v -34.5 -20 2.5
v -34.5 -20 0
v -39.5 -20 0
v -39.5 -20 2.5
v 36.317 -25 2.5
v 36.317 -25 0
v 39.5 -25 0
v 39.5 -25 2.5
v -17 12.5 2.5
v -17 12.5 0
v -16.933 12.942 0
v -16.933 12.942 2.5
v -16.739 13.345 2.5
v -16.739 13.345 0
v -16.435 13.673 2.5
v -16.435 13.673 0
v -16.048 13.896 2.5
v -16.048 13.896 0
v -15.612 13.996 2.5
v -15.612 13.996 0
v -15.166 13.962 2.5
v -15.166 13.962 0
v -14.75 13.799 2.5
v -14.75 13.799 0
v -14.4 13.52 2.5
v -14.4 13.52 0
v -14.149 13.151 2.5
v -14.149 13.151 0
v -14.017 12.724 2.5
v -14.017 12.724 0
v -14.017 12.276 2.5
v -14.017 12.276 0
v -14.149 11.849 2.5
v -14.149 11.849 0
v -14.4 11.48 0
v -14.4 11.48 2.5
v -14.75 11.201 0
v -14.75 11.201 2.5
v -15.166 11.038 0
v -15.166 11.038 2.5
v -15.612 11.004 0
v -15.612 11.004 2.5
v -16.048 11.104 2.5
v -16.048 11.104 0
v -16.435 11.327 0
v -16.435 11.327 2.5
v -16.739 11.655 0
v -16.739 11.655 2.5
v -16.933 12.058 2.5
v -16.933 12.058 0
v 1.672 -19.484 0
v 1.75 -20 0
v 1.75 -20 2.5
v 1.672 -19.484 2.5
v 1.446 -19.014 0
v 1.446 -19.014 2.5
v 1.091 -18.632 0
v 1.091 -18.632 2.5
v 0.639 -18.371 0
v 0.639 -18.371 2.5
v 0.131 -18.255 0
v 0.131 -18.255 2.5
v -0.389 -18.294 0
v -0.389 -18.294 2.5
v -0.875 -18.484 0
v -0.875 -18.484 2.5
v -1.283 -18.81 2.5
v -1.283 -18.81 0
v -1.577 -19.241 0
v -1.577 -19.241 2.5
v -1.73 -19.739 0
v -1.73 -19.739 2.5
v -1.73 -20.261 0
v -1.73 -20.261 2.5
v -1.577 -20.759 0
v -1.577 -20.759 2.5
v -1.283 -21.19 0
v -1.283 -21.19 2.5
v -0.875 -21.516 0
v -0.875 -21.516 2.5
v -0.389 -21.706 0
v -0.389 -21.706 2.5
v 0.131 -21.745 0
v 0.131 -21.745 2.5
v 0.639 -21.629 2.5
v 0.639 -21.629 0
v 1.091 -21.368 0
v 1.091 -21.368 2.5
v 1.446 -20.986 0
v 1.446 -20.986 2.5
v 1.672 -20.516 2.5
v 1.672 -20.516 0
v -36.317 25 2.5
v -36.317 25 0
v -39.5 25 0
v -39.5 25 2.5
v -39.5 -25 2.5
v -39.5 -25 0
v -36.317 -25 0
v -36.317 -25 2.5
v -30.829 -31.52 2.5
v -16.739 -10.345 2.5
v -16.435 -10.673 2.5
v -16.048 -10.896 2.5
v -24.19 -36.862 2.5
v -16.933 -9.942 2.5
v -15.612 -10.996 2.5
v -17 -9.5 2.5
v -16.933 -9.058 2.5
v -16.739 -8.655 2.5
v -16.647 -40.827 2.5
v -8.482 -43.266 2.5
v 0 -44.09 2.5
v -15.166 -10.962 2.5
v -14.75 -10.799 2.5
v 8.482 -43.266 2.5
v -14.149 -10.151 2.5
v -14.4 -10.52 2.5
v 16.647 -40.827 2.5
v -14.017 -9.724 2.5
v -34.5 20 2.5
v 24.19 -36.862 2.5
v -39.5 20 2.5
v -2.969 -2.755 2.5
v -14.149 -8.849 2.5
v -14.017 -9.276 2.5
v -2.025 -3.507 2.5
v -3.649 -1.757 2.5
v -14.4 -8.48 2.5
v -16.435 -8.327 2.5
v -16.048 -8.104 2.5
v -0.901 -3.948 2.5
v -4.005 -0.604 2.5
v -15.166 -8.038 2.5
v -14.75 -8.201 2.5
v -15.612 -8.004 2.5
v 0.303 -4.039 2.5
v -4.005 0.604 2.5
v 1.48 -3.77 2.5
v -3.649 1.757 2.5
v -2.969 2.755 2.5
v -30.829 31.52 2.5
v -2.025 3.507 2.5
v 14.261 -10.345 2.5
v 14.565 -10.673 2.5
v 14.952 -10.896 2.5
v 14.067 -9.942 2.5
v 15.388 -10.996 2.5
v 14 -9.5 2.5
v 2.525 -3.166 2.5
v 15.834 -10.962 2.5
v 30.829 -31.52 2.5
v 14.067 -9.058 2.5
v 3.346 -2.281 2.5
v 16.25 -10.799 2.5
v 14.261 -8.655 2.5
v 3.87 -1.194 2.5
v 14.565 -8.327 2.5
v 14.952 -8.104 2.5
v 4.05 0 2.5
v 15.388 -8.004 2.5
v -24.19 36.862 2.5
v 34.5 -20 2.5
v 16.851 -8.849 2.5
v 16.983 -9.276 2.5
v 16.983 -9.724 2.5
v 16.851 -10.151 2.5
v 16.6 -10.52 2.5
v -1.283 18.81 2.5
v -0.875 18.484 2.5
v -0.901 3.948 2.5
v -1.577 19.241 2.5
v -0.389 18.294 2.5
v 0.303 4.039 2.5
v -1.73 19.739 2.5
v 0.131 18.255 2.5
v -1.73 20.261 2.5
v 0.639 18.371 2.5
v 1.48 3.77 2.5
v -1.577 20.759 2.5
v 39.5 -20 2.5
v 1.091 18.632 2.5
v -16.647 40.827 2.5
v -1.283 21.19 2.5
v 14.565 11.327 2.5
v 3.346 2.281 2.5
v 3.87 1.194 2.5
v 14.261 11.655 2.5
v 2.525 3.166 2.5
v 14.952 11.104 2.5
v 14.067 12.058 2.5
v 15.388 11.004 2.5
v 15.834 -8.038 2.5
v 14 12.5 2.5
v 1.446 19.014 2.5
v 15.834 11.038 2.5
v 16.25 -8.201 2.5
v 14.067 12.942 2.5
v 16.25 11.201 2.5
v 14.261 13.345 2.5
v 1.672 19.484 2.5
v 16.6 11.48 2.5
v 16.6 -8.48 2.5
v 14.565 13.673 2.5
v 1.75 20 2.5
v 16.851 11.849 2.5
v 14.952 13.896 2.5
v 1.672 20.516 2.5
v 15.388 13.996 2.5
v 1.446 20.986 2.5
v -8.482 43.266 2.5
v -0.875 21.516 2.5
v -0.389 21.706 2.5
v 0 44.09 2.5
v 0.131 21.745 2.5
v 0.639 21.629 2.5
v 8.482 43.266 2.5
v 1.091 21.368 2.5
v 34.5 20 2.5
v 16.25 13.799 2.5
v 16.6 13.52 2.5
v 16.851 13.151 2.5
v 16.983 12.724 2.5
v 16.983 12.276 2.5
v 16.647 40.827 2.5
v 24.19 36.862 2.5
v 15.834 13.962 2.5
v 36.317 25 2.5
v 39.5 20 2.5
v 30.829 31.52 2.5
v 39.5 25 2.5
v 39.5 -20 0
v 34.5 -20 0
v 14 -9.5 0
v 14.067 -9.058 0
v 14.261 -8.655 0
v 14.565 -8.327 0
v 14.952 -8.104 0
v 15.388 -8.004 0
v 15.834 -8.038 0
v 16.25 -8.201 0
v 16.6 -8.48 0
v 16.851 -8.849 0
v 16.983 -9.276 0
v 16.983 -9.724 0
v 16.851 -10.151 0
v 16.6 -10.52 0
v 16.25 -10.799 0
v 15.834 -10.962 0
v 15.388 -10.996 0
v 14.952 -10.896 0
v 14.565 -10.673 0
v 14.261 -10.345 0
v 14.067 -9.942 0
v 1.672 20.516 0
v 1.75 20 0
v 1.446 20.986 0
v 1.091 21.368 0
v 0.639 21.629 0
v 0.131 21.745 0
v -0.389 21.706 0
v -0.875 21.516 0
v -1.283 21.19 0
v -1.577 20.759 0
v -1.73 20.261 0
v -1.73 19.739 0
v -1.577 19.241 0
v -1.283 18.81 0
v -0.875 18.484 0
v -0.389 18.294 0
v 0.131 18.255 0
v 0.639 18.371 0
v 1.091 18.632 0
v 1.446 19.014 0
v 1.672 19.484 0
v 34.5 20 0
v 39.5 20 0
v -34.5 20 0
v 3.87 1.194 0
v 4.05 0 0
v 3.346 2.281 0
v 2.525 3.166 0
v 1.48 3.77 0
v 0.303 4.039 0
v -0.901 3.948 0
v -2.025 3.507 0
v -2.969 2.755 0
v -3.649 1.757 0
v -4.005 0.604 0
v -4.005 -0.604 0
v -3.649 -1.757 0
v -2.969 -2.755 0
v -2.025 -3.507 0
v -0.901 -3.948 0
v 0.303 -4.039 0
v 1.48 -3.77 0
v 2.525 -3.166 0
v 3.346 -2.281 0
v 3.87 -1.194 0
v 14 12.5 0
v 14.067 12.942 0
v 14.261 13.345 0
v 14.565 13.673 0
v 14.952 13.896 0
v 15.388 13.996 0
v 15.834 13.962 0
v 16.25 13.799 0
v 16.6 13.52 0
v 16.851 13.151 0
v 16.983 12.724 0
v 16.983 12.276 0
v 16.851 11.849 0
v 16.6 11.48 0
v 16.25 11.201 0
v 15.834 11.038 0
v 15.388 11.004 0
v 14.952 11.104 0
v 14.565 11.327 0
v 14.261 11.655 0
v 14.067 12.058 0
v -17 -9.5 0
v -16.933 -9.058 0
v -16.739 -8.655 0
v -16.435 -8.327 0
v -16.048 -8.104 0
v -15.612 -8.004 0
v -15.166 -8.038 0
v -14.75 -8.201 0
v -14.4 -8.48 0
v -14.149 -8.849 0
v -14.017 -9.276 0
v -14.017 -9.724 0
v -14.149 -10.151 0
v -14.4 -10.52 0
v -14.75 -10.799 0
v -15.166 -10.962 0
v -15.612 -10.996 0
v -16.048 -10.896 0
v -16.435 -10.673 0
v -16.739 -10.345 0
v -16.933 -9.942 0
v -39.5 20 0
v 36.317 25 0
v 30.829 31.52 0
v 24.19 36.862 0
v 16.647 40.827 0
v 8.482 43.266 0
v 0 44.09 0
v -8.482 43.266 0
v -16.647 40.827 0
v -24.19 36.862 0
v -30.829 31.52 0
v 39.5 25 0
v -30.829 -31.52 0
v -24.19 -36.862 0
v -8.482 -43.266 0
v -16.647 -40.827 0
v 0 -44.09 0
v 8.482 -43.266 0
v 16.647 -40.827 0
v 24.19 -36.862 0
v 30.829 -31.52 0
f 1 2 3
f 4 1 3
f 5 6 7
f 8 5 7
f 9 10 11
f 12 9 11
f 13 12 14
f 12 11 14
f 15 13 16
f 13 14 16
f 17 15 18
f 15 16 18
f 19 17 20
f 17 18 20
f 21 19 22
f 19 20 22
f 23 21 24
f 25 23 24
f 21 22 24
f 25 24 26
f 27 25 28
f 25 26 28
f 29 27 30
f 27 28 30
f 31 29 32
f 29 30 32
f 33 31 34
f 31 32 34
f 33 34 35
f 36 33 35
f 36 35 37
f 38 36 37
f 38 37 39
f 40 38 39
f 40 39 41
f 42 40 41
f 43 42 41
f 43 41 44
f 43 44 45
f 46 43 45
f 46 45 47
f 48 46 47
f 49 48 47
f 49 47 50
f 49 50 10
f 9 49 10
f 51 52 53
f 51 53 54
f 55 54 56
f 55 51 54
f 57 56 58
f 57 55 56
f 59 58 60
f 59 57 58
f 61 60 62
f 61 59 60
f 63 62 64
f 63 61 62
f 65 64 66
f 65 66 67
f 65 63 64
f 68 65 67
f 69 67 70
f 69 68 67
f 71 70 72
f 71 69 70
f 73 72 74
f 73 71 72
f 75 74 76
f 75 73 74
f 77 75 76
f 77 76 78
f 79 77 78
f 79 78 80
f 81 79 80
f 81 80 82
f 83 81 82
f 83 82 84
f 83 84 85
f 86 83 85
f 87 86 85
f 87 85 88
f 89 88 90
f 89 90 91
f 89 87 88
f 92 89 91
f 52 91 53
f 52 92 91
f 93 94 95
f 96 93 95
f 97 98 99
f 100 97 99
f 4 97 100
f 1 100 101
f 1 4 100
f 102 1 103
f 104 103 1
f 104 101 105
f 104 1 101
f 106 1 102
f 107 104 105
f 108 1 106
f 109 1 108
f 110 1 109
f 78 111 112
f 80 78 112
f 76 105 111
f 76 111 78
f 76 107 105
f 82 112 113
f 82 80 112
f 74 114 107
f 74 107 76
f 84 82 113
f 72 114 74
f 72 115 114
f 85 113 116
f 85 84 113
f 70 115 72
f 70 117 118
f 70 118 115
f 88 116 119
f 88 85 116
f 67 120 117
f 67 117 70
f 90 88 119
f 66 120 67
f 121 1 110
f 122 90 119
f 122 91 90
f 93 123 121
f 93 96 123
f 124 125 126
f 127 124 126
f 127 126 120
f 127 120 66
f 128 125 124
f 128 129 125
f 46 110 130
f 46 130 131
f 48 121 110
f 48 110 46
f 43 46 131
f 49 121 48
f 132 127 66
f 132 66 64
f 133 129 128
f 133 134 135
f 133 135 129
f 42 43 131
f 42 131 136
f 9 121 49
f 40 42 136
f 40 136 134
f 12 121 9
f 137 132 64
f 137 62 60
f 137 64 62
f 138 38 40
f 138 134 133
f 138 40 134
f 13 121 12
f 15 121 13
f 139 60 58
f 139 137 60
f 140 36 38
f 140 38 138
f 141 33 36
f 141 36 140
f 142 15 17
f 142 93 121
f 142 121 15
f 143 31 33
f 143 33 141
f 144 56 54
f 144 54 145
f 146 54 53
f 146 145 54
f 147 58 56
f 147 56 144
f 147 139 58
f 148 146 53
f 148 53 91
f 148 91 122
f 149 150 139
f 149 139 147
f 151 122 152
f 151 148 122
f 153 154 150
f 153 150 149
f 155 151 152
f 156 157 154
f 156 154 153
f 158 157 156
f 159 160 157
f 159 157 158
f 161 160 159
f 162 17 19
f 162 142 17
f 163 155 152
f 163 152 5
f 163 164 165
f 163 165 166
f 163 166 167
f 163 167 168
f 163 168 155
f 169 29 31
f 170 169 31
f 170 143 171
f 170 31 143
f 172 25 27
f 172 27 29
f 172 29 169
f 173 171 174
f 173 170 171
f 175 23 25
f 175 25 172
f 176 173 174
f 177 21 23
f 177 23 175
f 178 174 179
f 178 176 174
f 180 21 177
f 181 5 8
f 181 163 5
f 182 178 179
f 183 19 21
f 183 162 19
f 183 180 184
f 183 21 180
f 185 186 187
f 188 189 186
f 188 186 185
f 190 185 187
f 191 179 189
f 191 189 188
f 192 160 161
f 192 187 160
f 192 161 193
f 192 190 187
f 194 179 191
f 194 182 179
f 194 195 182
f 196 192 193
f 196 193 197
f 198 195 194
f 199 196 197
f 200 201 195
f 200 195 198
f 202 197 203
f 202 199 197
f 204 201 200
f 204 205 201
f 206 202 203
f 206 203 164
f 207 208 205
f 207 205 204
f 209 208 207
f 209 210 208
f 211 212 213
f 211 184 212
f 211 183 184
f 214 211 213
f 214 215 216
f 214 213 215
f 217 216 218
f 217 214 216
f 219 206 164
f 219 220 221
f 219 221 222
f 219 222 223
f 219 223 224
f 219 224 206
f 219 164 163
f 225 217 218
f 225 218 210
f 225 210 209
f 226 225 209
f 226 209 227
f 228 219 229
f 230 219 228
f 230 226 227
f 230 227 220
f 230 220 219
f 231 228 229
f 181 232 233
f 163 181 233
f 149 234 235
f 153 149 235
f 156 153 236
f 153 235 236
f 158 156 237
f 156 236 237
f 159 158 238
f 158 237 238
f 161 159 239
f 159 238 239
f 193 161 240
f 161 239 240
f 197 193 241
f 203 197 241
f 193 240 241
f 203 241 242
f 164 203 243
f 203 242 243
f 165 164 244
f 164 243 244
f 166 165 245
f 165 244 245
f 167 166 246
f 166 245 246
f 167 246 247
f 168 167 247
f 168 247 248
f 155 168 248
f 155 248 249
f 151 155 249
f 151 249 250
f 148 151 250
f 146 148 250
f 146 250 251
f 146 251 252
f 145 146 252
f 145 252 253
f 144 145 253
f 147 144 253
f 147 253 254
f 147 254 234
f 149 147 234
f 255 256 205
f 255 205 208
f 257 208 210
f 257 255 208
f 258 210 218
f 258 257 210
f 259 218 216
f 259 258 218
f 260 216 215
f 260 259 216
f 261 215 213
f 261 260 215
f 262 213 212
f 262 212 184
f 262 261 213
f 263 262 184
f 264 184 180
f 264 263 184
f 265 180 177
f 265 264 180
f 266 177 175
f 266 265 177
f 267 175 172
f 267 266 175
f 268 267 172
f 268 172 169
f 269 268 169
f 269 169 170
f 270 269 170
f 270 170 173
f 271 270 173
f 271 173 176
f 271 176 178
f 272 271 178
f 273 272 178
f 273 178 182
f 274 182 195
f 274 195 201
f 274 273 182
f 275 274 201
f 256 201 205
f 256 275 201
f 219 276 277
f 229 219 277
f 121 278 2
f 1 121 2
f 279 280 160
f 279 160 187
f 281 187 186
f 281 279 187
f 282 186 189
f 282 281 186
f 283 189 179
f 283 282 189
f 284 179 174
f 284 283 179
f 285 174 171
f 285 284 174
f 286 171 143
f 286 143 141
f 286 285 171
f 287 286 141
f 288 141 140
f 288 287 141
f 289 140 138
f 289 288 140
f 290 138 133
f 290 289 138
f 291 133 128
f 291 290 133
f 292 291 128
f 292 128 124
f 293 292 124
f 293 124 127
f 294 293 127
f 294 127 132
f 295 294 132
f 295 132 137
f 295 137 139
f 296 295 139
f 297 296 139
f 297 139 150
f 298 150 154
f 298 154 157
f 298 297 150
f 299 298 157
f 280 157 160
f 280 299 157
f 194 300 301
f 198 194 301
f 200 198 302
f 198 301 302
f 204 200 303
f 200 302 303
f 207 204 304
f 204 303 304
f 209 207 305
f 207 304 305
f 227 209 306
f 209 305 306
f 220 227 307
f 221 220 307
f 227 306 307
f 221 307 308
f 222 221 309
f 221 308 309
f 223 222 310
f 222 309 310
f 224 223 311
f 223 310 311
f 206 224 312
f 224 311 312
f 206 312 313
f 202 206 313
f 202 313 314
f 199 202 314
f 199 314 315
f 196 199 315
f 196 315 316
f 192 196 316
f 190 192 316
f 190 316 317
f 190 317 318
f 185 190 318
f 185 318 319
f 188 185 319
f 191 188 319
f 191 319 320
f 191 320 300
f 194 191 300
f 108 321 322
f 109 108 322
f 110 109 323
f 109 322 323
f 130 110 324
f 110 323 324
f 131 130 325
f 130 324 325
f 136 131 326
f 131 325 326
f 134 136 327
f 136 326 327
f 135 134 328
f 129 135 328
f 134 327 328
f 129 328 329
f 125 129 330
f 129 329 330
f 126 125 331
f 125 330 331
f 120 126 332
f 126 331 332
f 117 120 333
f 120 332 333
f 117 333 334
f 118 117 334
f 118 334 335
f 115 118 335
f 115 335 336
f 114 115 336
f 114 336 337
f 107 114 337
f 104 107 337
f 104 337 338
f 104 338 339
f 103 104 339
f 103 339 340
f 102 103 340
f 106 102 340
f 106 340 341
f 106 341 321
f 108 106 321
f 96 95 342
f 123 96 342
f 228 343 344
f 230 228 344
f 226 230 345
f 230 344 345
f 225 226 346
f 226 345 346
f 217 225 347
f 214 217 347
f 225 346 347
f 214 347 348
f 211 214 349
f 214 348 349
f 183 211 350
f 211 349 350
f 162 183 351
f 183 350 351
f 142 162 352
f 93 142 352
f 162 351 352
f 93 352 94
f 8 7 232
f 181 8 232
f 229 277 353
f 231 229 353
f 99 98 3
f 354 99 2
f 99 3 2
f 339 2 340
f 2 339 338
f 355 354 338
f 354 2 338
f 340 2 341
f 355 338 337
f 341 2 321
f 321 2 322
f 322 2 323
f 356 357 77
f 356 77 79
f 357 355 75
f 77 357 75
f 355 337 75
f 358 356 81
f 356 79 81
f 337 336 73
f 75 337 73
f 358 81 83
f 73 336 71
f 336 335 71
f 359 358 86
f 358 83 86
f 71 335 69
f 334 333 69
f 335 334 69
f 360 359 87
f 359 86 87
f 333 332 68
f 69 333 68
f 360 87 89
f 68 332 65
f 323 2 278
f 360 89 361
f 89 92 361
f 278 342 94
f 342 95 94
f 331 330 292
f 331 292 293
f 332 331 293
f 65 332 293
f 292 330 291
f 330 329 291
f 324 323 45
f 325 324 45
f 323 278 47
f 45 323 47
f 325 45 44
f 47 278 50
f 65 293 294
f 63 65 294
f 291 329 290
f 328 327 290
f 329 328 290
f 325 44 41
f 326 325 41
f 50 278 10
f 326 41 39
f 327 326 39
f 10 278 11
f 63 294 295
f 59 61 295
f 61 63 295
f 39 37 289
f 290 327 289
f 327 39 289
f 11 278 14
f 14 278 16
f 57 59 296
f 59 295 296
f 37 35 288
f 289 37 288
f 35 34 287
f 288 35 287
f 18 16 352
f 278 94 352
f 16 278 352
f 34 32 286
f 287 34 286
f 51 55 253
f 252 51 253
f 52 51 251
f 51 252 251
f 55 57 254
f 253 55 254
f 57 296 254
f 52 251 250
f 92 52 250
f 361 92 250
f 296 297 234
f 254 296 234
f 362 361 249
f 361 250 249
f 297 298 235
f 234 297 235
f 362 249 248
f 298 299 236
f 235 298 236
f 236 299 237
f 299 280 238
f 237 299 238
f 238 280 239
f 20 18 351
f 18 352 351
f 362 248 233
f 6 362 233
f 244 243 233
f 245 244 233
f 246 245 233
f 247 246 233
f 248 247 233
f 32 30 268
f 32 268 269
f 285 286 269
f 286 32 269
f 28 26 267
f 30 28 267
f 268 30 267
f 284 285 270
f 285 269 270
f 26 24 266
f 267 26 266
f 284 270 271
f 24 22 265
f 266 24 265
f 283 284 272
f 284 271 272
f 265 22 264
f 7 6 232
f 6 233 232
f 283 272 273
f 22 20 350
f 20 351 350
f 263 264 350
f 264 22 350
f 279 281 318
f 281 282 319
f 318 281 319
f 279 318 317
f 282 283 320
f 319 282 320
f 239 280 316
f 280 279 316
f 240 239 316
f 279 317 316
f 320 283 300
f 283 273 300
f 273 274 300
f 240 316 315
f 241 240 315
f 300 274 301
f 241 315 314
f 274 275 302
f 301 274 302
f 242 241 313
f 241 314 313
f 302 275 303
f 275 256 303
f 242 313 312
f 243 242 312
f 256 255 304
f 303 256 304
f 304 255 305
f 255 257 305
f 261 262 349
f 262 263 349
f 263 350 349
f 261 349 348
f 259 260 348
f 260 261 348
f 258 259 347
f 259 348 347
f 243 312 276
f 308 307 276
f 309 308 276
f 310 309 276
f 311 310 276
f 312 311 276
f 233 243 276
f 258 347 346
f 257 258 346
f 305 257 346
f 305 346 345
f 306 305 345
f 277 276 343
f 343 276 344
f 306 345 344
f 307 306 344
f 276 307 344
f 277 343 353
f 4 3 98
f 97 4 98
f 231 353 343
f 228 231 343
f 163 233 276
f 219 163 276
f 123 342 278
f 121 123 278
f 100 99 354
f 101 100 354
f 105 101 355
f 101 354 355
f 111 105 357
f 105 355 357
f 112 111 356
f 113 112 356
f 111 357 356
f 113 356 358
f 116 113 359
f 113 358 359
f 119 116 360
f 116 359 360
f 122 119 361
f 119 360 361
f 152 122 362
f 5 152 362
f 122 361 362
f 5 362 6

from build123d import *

# Parameters (mm, degrees)
CROQUIS1_R              = 4.05
CROQUIS1_R_2            = 1.75
SALIENTE_EXTRUIR1_DEPTH = 2.5
CROQUIS2_R              = 1.5
CORTAR_EXTRUIR1_DEPTH   = 4


with BuildPart() as part:
    # Croquis1 → Saliente-Extruir1 (new body)
    with BuildSketch(Plane.XY):
        with BuildLine():
            Line((-39.500346279, 20), (-34.500346279, 20))
            Line((-34.500346279, 20), (-34.500346279, -20))
            Line((-34.500346279, -20), (-39.500346279, -20))
            Line((-39.500346279, -20), (-39.500346279, -25))
            Line((-39.500346279, -25), (-36.317049715, -25))
            ThreePointArc((-36.317049715, -25), (0, -44.09), (36.317049715, -25))
            Line((36.317049715, -25), (39.500346279, -25))
            Line((39.500346279, -25), (39.500346279, -20))
            Line((39.500346279, -20), (34.500346279, -20))
            Line((34.500346279, -20), (34.500346279, 20))
            Line((34.500346279, 20), (39.500346279, 20))
            Line((39.500346279, 20), (39.500346279, 25))
            Line((39.500346279, 25), (36.317049715, 25))
            ThreePointArc((36.317049715, 25), (0, 44.09), (-36.317049715, 25))
            Line((-36.317049715, 25), (-39.500346279, 25))
            Line((-39.500346279, 25), (-39.500346279, 20))
        make_face()
        Circle(CROQUIS1_R, mode=Mode.SUBTRACT)
        with Locations((0, 20)):
            Circle(CROQUIS1_R_2, mode=Mode.SUBTRACT)
        with Locations((0, -20)):
            Circle(CROQUIS1_R_2, mode=Mode.SUBTRACT)
    extrude(amount=SALIENTE_EXTRUIR1_DEPTH)

    # Croquis2 → Cortar-Extruir1 (cut)
    with BuildSketch(Plane(origin=(0, 0, 0), x_dir=(-1, 0, 0), z_dir=(0, 0, -1))):
        with Locations((15.5, -9.5)):
            Circle(CROQUIS2_R)
        with Locations((15.5, 12.5)):
            Circle(CROQUIS2_R)
        with Locations((-15.5, 12.5)):
            Circle(CROQUIS2_R)
        with Locations((-15.5, -9.5)):
            Circle(CROQUIS2_R)
    extrude(amount=-CORTAR_EXTRUIR1_DEPTH, mode=Mode.SUBTRACT)


solid = part.part
